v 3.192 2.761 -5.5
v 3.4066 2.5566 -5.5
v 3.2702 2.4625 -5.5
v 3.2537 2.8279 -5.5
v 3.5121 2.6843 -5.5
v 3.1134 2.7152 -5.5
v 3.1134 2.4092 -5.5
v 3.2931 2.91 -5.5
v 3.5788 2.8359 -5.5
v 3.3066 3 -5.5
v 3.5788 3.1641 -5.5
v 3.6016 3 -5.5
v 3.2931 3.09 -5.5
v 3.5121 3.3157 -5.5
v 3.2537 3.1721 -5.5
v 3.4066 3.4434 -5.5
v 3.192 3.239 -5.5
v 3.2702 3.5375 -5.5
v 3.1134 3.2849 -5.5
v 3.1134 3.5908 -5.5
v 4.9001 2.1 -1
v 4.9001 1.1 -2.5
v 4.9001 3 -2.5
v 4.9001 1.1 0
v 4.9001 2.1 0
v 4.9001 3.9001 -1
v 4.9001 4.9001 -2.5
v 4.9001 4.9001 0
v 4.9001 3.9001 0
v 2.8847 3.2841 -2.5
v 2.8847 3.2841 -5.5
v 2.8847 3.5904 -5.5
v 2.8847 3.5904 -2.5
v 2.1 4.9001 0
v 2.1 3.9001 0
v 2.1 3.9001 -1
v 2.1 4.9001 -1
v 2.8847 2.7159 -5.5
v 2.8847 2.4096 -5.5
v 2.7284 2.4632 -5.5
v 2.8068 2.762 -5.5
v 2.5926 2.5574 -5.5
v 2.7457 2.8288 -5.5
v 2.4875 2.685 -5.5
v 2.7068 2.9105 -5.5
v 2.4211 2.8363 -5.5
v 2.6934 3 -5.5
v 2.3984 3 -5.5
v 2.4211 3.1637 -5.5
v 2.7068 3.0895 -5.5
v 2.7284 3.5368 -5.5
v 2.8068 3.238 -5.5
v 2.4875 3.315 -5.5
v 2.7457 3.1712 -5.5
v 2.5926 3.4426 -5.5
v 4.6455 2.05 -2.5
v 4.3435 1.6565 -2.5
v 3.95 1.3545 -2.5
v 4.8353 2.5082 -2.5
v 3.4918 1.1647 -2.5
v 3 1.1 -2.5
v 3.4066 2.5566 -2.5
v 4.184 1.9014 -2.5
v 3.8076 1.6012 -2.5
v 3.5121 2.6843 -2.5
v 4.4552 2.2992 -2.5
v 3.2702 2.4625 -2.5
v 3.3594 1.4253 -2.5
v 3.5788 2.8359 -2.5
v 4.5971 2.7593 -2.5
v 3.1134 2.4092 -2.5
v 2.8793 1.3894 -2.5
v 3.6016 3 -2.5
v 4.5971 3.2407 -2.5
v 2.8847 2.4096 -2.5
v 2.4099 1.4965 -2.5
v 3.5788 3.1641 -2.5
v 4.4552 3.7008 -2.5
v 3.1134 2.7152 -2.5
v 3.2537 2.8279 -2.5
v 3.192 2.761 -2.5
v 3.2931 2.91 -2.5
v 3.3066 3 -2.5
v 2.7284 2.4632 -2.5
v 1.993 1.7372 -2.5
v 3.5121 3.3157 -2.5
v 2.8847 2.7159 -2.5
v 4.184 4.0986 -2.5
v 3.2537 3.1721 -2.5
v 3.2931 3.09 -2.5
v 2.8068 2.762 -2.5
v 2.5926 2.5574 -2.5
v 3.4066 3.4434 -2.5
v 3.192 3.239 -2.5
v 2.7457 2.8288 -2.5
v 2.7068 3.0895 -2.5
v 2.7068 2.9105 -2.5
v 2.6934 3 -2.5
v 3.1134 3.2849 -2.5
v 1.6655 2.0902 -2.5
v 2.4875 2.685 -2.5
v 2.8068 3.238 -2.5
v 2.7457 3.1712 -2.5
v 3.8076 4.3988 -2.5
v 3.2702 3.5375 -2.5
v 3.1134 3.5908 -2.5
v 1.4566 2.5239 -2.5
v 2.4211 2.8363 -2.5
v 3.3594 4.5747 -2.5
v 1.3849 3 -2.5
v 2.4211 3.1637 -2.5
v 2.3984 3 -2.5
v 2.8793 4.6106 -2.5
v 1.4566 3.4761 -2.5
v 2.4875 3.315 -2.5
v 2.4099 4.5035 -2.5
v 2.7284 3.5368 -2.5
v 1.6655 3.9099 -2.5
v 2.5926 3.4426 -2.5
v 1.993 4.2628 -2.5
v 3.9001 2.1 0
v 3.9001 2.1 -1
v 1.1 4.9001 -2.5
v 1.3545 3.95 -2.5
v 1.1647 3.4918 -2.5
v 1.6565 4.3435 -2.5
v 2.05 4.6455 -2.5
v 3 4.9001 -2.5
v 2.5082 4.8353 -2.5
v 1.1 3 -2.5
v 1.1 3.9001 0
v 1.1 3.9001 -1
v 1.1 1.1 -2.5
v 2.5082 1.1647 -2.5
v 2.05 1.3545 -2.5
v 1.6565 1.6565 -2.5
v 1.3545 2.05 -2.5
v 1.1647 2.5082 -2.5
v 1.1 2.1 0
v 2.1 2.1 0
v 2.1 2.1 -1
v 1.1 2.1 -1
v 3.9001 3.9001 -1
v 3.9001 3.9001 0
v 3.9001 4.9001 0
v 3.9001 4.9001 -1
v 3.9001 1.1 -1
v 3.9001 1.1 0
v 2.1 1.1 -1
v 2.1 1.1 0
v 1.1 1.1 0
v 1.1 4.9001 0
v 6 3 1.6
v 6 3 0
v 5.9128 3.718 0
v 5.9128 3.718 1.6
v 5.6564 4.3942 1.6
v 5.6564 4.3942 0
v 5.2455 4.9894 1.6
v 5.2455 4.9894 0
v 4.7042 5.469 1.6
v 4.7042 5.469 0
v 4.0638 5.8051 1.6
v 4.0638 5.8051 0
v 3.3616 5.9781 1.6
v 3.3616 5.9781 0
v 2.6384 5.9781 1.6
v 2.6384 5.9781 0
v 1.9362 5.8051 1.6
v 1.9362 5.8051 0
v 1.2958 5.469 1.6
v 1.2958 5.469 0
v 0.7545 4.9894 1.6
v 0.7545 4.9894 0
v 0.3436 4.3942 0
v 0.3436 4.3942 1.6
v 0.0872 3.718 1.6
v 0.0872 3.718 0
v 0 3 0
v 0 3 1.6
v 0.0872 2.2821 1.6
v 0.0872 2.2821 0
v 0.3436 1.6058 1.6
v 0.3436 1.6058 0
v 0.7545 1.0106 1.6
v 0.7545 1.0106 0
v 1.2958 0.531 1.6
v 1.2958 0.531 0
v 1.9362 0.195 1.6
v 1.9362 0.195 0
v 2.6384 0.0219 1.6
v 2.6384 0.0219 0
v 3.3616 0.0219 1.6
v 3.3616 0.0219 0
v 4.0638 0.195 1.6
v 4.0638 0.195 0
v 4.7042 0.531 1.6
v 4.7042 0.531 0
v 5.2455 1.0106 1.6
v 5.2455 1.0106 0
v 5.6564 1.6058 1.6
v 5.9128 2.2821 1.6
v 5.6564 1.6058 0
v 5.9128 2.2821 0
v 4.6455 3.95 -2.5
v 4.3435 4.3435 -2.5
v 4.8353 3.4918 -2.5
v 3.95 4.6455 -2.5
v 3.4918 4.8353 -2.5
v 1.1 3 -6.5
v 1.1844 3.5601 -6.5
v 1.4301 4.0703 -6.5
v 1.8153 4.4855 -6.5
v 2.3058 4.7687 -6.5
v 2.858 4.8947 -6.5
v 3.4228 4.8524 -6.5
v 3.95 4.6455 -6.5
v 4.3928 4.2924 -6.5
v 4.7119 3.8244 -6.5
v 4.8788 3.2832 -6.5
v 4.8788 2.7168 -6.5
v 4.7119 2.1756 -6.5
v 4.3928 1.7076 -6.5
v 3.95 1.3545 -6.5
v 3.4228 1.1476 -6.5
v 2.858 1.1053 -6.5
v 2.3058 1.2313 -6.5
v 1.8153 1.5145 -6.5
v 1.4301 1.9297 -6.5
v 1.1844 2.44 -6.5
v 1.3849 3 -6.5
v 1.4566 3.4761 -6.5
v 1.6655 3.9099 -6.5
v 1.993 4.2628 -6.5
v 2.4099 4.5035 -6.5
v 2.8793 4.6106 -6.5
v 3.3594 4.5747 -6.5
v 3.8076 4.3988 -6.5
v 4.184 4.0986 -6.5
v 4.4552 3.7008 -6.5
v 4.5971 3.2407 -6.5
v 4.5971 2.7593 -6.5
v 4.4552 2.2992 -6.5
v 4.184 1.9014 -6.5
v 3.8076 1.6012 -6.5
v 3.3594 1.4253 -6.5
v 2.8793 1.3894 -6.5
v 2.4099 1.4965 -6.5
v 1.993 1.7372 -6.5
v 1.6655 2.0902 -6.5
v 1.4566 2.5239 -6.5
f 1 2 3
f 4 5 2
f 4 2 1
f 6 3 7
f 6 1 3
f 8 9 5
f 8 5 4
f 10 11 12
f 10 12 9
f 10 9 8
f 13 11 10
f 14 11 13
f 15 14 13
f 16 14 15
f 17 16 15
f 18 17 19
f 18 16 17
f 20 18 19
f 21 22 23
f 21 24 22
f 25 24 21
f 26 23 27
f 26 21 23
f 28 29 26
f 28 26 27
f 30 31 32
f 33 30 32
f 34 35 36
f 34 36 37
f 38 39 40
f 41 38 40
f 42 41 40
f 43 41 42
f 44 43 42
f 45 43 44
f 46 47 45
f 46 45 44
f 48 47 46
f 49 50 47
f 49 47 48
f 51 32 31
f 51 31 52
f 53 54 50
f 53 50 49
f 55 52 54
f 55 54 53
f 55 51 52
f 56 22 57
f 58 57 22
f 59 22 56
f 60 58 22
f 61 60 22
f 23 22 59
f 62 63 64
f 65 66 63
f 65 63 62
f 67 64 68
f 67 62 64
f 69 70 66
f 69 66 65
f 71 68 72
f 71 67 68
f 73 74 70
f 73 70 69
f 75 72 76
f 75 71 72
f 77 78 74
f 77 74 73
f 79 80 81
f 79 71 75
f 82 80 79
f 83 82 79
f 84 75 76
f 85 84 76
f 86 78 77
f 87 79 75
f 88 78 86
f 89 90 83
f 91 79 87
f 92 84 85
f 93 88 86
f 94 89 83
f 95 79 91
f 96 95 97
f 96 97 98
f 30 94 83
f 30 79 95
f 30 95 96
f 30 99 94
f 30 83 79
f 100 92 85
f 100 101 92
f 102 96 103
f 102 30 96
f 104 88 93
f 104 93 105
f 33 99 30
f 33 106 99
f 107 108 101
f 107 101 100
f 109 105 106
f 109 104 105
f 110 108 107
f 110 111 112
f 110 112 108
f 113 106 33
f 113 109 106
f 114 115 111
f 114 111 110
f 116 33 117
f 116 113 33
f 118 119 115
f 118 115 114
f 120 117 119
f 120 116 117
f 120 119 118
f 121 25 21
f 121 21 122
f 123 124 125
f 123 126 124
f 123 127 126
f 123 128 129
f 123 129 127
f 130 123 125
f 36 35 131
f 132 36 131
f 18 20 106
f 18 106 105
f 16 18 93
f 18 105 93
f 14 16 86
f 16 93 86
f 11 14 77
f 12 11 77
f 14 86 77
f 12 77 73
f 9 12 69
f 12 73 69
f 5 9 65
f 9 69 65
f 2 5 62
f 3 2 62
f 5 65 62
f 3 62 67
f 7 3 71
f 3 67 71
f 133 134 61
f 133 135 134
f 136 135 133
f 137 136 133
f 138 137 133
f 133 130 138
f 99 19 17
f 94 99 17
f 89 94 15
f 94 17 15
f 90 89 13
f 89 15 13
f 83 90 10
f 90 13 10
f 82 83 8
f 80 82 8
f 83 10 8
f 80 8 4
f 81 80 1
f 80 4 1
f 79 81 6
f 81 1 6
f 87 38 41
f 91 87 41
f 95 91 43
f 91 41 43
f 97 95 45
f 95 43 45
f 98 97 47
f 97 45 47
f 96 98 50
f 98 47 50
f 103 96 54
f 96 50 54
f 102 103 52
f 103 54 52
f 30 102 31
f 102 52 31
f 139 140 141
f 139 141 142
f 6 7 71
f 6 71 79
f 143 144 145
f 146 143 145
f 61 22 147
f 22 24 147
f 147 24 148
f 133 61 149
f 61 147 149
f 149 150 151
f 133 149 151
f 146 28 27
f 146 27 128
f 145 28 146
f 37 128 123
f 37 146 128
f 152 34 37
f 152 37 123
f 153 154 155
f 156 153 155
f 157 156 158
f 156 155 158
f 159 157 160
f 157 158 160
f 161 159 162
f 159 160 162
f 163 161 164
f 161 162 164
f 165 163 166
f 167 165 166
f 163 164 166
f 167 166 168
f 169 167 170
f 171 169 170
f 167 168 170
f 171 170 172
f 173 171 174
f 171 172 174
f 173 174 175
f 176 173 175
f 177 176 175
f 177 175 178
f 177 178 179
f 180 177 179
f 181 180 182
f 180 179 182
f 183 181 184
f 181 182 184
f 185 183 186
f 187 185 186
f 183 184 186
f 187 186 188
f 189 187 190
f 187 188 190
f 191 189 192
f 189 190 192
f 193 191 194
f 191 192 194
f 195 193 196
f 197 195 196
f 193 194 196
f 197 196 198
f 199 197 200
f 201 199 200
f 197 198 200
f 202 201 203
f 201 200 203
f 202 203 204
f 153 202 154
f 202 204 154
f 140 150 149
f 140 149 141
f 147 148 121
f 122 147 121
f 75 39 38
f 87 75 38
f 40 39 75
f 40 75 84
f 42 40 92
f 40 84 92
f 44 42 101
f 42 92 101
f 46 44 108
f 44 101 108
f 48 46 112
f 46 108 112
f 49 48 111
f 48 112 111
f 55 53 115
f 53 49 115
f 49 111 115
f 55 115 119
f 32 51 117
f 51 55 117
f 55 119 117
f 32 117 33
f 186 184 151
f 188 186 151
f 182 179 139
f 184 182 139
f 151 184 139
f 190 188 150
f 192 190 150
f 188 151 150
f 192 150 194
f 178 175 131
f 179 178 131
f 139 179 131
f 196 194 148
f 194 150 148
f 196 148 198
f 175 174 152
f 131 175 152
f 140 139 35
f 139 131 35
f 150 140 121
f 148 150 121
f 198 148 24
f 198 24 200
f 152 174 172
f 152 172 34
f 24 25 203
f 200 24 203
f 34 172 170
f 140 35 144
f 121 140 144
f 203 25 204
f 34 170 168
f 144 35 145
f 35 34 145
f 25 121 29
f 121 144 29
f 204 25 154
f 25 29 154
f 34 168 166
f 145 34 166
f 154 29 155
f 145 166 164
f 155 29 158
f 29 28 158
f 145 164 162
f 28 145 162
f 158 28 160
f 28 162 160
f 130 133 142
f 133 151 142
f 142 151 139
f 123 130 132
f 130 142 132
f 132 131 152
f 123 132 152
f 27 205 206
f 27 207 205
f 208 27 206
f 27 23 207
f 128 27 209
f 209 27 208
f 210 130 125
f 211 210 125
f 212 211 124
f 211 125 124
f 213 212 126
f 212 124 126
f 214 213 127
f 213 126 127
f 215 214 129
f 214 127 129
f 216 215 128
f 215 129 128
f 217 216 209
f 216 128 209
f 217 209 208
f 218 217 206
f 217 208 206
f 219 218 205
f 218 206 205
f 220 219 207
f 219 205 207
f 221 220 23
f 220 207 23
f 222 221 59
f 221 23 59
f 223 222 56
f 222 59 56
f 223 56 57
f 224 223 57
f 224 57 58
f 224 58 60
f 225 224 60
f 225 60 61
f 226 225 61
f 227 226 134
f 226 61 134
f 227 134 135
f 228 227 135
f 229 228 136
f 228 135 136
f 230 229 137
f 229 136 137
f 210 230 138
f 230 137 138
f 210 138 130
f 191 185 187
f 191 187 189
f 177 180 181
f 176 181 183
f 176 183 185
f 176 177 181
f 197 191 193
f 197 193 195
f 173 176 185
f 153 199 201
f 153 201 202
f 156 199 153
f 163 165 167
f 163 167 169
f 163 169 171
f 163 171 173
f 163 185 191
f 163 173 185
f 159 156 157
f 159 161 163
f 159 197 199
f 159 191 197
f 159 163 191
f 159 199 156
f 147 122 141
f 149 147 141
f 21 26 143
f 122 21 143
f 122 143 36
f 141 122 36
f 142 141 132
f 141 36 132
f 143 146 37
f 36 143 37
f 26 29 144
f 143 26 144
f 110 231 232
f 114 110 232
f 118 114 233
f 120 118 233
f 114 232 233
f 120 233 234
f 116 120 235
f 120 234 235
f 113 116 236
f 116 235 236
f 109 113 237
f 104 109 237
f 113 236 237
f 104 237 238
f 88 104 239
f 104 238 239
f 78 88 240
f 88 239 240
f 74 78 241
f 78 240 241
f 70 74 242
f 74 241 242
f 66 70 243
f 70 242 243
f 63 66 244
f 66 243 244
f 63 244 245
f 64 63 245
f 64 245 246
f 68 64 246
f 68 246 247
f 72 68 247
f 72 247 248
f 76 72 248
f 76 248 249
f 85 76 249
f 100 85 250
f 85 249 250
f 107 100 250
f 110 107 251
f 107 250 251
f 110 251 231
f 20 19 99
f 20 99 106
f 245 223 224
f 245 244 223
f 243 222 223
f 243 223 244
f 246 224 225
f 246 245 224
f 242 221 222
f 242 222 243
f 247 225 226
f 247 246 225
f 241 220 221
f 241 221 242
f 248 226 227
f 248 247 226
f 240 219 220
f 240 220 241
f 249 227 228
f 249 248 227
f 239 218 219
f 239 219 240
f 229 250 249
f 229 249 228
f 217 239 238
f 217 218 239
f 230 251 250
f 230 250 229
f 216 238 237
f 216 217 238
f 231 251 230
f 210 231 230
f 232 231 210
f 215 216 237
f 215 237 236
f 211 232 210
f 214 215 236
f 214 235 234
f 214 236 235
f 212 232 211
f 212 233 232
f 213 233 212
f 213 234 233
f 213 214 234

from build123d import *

# Parameters (mm, degrees)
SKETCH_3_R          = 3.00000508
EXTRUDE_1_DEPTH     = 1.6
SKETCH_4_W          = 1
SKETCH_4_H          = 1
EXTRUDE_2_DEPTH     = 1
SKETCH_5_W          = 3.8001016
SKETCH_5_H          = 3.8001016
EXTRUDE_3_DEPTH     = 1.5
SKETCH_6_R          = 1.9000508
EXTRUDE_4_DEPTH     = 4
SKETCH_7_R          = 1.615152196
CUT_EXTRUDE_1_DEPTH = 4
SKETCH_8_R          = 0.601590178
EXTRUDE_5_DEPTH     = 3
SKETCH_9_R          = 0.306574413
CUT_EXTRUDE_2_DEPTH = 3
SKETCH_10_W         = 0.228686602
SKETCH_10_H         = 1.655690995
CUT_EXTRUDE_3_DEPTH = 3


with BuildPart() as part:
    # 草图3 → 凸台-拉伸1 (new body)
    with BuildSketch(Plane.XY):
        with Locations((3.00000508, 3.00000508)):
            Circle(SKETCH_3_R)
    extrude(amount=EXTRUDE_1_DEPTH)

    # 草图4 → 凸台-拉伸2 (add)
    with BuildSketch(Plane(origin=(0, 0, 0), x_dir=(-1, 0, 0), z_dir=(0, 0, -1))):
        with Locations((-1.59995428, 1.59995428)):
            Rectangle(SKETCH_4_W, SKETCH_4_H)
        with Locations((-1.59995428, 4.40005588)):
            Rectangle(SKETCH_4_W, SKETCH_4_H)
        with Locations((-4.40005588, 4.40005588)):
            Rectangle(SKETCH_4_W, SKETCH_4_H)
        with Locations((-4.40005588, 1.59995428)):
            Rectangle(SKETCH_4_W, SKETCH_4_H)
    extrude(amount=EXTRUDE_2_DEPTH)

    # 草图5 → 凸台-拉伸3 (add)
    with BuildSketch(Plane(origin=(0, 0, -1), x_dir=(-1, 0, 0), z_dir=(0, 0, -1))):
        with Locations((-3.00000508, 3.00000508)):
            Rectangle(SKETCH_5_W, SKETCH_5_H)
    extrude(amount=EXTRUDE_3_DEPTH)

    # 草图6 → 凸台-拉伸4 (add)
    with BuildSketch(Plane(origin=(0, 0, -2.5), x_dir=(-1, 0, 0), z_dir=(0, 0, -1))):
        with Locations((-3.00000508, 3.00000508)):
            Circle(SKETCH_6_R)
    extrude(amount=EXTRUDE_4_DEPTH)

    # 草图7 → 切除-拉伸1 (cut)
    with BuildSketch(Plane(origin=(0, 0, -6.5), x_dir=(-1, 0, 0), z_dir=(0, 0, -1))):
        with Locations((-3.00000508, 3.00000508)):
            Circle(SKETCH_7_R)
    extrude(amount=-CUT_EXTRUDE_1_DEPTH, mode=Mode.SUBTRACT)

    # 草图8 → 凸台-拉伸5 (add)
    with BuildSketch(Plane(origin=(0, 0, -2.5), x_dir=(-1, 0, 0), z_dir=(0, 0, -1))):
        with Locations((-3.00000508, 3.00000508)):
            Circle(SKETCH_8_R)
    extrude(amount=EXTRUDE_5_DEPTH)

    # 草图9 → 切除-拉伸2 (cut)
    with BuildSketch(Plane(origin=(0, 0, -5.5), x_dir=(-1, 0, 0), z_dir=(0, 0, -1))):
        with Locations((-3.00000508, 3.00000508)):
            Circle(SKETCH_9_R)
    extrude(amount=-CUT_EXTRUDE_2_DEPTH, mode=Mode.SUBTRACT)

    # 草图10 → 切除-拉伸3 (cut)
    with BuildSketch(Plane(origin=(0, 0, -5.5), x_dir=(-1, 0, 0), z_dir=(0, 0, -1))):
        with Locations((-2.999022369, 2.996212045)):
            Rectangle(SKETCH_10_W, SKETCH_10_H)
    extrude(amount=-CUT_EXTRUDE_3_DEPTH, mode=Mode.SUBTRACT)


solid = part.part
